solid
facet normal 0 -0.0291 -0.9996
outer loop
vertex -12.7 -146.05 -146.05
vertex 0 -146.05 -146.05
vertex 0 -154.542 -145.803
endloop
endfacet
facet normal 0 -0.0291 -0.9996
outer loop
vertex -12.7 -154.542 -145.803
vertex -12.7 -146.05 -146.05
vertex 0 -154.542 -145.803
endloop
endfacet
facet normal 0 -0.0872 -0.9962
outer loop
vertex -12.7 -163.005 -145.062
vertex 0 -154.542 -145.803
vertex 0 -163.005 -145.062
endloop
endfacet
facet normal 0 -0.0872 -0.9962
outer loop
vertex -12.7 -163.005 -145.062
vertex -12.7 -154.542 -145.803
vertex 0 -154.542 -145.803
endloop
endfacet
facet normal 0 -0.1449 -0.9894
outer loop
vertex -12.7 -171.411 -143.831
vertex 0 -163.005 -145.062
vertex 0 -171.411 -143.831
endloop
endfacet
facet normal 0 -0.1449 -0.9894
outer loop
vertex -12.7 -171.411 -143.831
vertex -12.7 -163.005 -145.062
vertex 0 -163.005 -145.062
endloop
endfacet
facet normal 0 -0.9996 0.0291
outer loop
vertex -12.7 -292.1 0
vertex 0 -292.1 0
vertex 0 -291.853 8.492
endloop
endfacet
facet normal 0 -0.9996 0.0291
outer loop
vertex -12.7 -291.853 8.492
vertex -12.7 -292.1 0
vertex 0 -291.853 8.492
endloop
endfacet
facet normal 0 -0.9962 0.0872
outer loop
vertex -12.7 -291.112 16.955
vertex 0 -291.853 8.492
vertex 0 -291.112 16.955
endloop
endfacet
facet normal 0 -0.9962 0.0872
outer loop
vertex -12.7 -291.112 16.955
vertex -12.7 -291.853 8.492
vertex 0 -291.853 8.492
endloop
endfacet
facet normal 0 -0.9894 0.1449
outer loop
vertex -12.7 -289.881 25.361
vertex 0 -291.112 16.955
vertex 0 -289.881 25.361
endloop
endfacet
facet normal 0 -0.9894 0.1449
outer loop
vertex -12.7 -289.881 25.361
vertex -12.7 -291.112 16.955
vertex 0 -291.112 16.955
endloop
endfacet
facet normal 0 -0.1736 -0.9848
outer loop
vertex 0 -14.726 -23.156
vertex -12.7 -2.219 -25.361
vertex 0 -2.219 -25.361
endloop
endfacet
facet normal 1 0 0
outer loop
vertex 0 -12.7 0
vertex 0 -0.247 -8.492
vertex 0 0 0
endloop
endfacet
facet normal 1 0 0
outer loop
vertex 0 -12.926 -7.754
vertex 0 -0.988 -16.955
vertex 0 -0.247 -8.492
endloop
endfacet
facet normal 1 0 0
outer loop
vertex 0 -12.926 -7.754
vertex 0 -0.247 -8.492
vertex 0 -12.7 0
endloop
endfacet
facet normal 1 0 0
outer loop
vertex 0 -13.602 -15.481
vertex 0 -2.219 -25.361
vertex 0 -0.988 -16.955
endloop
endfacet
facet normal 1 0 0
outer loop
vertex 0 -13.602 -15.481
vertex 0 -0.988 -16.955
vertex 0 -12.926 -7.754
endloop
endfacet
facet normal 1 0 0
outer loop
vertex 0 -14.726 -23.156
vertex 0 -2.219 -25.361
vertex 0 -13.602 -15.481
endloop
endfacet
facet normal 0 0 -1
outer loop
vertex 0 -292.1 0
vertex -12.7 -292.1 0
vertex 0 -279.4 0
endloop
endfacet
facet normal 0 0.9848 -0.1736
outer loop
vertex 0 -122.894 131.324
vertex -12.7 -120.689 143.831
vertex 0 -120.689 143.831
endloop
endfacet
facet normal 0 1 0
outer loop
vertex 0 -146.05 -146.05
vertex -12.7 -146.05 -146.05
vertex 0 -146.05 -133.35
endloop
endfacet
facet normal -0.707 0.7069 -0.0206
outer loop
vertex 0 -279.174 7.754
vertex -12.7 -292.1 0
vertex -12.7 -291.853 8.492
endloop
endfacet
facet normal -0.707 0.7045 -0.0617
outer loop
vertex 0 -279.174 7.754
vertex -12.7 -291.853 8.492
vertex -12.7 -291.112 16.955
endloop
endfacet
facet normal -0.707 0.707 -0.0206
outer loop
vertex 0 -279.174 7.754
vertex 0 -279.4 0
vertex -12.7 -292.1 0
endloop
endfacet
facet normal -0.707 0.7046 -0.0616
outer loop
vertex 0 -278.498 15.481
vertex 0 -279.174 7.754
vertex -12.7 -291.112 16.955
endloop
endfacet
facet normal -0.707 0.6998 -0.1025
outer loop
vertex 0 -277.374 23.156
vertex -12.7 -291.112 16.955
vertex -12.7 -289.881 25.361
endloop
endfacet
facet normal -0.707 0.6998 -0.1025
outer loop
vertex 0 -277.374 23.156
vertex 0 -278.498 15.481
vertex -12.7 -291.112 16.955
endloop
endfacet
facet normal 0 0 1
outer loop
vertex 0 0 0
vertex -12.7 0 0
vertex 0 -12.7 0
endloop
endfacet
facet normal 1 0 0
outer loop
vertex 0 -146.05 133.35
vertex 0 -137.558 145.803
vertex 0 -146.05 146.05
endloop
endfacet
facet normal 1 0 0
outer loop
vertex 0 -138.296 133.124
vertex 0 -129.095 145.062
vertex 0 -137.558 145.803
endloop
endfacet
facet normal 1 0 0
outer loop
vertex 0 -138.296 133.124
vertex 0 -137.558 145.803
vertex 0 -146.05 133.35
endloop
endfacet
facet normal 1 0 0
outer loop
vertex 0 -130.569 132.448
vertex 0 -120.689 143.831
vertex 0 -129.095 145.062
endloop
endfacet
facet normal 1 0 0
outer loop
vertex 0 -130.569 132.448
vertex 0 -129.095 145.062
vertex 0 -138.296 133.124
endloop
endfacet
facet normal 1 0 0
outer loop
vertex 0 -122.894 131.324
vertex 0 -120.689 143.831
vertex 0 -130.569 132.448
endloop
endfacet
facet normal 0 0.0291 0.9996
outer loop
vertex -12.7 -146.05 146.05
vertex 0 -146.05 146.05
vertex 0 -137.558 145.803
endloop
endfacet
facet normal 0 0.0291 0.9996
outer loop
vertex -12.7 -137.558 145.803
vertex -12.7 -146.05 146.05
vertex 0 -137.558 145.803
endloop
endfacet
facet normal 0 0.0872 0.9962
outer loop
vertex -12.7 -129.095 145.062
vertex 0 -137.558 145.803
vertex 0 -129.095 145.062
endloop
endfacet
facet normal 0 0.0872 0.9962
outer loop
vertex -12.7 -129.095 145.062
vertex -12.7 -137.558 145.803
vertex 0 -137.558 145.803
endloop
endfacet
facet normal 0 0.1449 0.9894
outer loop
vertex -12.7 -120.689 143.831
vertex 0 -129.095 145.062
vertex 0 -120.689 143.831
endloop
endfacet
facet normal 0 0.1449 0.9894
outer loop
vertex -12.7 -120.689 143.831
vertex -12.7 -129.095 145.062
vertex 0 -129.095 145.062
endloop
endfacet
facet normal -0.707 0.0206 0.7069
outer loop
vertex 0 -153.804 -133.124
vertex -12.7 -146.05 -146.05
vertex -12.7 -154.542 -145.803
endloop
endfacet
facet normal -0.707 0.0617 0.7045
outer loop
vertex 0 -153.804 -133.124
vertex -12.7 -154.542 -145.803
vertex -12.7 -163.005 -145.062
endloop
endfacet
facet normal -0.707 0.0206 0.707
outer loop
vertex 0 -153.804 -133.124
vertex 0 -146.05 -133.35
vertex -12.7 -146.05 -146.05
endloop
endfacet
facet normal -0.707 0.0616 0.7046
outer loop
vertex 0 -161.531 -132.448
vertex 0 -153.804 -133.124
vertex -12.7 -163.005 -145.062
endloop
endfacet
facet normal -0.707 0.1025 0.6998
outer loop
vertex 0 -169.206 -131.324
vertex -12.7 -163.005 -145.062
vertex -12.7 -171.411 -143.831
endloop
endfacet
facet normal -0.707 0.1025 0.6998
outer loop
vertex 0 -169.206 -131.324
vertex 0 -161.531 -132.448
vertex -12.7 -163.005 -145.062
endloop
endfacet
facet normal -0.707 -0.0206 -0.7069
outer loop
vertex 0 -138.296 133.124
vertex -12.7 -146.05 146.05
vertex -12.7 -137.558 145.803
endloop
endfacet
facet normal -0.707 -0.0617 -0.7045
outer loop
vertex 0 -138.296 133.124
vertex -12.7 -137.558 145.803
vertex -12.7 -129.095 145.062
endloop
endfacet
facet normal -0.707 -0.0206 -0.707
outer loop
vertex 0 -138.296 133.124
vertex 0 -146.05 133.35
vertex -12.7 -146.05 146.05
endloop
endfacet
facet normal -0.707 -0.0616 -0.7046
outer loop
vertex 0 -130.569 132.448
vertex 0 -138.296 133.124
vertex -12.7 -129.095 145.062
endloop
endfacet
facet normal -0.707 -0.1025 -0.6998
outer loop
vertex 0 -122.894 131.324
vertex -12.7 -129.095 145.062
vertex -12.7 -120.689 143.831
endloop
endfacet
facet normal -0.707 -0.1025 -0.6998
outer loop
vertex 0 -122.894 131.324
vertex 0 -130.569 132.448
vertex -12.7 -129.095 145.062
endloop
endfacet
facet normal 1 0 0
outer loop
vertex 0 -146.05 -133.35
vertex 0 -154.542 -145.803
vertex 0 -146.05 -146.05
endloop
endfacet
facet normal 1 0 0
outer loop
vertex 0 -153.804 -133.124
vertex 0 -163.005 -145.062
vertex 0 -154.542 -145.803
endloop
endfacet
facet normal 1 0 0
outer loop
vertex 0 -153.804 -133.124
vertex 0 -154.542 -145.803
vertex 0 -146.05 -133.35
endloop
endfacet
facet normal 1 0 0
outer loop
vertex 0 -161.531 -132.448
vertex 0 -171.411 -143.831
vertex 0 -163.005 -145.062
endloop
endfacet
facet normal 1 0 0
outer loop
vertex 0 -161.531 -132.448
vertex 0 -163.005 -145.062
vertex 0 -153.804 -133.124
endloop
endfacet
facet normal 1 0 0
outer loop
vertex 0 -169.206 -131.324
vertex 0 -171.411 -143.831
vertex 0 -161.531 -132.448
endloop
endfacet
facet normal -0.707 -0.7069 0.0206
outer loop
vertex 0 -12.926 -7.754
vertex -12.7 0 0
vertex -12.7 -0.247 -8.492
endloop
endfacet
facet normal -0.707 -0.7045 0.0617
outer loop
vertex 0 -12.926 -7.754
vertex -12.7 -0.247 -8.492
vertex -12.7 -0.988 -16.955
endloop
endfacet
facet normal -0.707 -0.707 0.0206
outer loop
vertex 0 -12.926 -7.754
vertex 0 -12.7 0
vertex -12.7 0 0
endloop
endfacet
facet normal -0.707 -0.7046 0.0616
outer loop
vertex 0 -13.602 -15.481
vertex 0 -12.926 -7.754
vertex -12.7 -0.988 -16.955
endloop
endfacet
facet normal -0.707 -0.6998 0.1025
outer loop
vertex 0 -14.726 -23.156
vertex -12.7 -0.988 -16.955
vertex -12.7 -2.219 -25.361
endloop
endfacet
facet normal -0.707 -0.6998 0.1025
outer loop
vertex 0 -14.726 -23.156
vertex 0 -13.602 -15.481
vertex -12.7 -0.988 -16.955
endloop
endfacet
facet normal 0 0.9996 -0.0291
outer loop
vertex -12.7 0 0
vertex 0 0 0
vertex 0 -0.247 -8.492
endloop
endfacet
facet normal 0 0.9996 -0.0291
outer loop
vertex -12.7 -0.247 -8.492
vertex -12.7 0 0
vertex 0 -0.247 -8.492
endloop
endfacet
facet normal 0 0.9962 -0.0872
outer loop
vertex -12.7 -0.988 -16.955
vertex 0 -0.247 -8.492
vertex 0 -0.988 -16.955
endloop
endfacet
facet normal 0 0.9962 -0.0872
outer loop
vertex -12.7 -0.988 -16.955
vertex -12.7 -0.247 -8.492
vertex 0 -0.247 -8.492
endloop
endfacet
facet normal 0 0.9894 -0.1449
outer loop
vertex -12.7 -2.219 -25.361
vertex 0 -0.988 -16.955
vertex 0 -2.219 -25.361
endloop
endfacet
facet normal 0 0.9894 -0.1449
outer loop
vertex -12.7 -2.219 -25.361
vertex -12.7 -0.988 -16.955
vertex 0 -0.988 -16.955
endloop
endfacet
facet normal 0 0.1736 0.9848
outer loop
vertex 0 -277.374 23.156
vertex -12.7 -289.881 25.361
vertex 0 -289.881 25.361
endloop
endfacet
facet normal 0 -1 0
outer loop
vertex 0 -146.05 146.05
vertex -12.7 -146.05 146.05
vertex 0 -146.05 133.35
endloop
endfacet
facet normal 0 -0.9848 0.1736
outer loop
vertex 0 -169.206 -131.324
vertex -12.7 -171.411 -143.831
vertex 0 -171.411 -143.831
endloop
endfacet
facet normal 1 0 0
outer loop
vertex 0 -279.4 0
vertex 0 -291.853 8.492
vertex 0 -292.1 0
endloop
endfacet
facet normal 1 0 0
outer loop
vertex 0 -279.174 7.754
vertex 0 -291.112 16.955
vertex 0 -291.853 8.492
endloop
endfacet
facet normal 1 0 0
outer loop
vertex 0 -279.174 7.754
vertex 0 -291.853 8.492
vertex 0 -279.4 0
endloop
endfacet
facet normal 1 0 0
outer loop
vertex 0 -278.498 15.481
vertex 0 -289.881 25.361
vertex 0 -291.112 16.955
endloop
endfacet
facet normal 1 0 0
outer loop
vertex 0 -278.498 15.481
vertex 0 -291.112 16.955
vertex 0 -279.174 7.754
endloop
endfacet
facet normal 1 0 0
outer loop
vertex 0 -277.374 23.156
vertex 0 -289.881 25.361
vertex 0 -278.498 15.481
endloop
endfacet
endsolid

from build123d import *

# Parameters (mm, degrees)
REVOLVE1_ANGLE    = 10
CIRPATTERN1_COUNT = 4


with BuildPart() as part:
    # Sketch1 → Revolve1 (revolve)
    with BuildSketch(Plane.XY):
        Polygon((0, 0), (-12.7, 0), (0, -12.7), align=None)
    revolve(axis=Axis((0, -146.05, 0), (-1, 0, 0)), revolution_arc=REVOLVE1_ANGLE)


with BuildPart() as cirpattern1_1:
    # CirPattern1: pattern copy
    add(part.part.rotate(Axis((0, -146.05, 0), (-1, 0, 0)), 1 * 360 / CIRPATTERN1_COUNT))


with BuildPart() as cirpattern1_2:
    # CirPattern1: pattern copy
    add(part.part.rotate(Axis((0, -146.05, 0), (-1, 0, 0)), 2 * 360 / CIRPATTERN1_COUNT))


with BuildPart() as cirpattern1_3:
    # CirPattern1: pattern copy
    add(part.part.rotate(Axis((0, -146.05, 0), (-1, 0, 0)), 3 * 360 / CIRPATTERN1_COUNT))


solid = Compound([part.part, cirpattern1_1.part, cirpattern1_2.part, cirpattern1_3.part])
